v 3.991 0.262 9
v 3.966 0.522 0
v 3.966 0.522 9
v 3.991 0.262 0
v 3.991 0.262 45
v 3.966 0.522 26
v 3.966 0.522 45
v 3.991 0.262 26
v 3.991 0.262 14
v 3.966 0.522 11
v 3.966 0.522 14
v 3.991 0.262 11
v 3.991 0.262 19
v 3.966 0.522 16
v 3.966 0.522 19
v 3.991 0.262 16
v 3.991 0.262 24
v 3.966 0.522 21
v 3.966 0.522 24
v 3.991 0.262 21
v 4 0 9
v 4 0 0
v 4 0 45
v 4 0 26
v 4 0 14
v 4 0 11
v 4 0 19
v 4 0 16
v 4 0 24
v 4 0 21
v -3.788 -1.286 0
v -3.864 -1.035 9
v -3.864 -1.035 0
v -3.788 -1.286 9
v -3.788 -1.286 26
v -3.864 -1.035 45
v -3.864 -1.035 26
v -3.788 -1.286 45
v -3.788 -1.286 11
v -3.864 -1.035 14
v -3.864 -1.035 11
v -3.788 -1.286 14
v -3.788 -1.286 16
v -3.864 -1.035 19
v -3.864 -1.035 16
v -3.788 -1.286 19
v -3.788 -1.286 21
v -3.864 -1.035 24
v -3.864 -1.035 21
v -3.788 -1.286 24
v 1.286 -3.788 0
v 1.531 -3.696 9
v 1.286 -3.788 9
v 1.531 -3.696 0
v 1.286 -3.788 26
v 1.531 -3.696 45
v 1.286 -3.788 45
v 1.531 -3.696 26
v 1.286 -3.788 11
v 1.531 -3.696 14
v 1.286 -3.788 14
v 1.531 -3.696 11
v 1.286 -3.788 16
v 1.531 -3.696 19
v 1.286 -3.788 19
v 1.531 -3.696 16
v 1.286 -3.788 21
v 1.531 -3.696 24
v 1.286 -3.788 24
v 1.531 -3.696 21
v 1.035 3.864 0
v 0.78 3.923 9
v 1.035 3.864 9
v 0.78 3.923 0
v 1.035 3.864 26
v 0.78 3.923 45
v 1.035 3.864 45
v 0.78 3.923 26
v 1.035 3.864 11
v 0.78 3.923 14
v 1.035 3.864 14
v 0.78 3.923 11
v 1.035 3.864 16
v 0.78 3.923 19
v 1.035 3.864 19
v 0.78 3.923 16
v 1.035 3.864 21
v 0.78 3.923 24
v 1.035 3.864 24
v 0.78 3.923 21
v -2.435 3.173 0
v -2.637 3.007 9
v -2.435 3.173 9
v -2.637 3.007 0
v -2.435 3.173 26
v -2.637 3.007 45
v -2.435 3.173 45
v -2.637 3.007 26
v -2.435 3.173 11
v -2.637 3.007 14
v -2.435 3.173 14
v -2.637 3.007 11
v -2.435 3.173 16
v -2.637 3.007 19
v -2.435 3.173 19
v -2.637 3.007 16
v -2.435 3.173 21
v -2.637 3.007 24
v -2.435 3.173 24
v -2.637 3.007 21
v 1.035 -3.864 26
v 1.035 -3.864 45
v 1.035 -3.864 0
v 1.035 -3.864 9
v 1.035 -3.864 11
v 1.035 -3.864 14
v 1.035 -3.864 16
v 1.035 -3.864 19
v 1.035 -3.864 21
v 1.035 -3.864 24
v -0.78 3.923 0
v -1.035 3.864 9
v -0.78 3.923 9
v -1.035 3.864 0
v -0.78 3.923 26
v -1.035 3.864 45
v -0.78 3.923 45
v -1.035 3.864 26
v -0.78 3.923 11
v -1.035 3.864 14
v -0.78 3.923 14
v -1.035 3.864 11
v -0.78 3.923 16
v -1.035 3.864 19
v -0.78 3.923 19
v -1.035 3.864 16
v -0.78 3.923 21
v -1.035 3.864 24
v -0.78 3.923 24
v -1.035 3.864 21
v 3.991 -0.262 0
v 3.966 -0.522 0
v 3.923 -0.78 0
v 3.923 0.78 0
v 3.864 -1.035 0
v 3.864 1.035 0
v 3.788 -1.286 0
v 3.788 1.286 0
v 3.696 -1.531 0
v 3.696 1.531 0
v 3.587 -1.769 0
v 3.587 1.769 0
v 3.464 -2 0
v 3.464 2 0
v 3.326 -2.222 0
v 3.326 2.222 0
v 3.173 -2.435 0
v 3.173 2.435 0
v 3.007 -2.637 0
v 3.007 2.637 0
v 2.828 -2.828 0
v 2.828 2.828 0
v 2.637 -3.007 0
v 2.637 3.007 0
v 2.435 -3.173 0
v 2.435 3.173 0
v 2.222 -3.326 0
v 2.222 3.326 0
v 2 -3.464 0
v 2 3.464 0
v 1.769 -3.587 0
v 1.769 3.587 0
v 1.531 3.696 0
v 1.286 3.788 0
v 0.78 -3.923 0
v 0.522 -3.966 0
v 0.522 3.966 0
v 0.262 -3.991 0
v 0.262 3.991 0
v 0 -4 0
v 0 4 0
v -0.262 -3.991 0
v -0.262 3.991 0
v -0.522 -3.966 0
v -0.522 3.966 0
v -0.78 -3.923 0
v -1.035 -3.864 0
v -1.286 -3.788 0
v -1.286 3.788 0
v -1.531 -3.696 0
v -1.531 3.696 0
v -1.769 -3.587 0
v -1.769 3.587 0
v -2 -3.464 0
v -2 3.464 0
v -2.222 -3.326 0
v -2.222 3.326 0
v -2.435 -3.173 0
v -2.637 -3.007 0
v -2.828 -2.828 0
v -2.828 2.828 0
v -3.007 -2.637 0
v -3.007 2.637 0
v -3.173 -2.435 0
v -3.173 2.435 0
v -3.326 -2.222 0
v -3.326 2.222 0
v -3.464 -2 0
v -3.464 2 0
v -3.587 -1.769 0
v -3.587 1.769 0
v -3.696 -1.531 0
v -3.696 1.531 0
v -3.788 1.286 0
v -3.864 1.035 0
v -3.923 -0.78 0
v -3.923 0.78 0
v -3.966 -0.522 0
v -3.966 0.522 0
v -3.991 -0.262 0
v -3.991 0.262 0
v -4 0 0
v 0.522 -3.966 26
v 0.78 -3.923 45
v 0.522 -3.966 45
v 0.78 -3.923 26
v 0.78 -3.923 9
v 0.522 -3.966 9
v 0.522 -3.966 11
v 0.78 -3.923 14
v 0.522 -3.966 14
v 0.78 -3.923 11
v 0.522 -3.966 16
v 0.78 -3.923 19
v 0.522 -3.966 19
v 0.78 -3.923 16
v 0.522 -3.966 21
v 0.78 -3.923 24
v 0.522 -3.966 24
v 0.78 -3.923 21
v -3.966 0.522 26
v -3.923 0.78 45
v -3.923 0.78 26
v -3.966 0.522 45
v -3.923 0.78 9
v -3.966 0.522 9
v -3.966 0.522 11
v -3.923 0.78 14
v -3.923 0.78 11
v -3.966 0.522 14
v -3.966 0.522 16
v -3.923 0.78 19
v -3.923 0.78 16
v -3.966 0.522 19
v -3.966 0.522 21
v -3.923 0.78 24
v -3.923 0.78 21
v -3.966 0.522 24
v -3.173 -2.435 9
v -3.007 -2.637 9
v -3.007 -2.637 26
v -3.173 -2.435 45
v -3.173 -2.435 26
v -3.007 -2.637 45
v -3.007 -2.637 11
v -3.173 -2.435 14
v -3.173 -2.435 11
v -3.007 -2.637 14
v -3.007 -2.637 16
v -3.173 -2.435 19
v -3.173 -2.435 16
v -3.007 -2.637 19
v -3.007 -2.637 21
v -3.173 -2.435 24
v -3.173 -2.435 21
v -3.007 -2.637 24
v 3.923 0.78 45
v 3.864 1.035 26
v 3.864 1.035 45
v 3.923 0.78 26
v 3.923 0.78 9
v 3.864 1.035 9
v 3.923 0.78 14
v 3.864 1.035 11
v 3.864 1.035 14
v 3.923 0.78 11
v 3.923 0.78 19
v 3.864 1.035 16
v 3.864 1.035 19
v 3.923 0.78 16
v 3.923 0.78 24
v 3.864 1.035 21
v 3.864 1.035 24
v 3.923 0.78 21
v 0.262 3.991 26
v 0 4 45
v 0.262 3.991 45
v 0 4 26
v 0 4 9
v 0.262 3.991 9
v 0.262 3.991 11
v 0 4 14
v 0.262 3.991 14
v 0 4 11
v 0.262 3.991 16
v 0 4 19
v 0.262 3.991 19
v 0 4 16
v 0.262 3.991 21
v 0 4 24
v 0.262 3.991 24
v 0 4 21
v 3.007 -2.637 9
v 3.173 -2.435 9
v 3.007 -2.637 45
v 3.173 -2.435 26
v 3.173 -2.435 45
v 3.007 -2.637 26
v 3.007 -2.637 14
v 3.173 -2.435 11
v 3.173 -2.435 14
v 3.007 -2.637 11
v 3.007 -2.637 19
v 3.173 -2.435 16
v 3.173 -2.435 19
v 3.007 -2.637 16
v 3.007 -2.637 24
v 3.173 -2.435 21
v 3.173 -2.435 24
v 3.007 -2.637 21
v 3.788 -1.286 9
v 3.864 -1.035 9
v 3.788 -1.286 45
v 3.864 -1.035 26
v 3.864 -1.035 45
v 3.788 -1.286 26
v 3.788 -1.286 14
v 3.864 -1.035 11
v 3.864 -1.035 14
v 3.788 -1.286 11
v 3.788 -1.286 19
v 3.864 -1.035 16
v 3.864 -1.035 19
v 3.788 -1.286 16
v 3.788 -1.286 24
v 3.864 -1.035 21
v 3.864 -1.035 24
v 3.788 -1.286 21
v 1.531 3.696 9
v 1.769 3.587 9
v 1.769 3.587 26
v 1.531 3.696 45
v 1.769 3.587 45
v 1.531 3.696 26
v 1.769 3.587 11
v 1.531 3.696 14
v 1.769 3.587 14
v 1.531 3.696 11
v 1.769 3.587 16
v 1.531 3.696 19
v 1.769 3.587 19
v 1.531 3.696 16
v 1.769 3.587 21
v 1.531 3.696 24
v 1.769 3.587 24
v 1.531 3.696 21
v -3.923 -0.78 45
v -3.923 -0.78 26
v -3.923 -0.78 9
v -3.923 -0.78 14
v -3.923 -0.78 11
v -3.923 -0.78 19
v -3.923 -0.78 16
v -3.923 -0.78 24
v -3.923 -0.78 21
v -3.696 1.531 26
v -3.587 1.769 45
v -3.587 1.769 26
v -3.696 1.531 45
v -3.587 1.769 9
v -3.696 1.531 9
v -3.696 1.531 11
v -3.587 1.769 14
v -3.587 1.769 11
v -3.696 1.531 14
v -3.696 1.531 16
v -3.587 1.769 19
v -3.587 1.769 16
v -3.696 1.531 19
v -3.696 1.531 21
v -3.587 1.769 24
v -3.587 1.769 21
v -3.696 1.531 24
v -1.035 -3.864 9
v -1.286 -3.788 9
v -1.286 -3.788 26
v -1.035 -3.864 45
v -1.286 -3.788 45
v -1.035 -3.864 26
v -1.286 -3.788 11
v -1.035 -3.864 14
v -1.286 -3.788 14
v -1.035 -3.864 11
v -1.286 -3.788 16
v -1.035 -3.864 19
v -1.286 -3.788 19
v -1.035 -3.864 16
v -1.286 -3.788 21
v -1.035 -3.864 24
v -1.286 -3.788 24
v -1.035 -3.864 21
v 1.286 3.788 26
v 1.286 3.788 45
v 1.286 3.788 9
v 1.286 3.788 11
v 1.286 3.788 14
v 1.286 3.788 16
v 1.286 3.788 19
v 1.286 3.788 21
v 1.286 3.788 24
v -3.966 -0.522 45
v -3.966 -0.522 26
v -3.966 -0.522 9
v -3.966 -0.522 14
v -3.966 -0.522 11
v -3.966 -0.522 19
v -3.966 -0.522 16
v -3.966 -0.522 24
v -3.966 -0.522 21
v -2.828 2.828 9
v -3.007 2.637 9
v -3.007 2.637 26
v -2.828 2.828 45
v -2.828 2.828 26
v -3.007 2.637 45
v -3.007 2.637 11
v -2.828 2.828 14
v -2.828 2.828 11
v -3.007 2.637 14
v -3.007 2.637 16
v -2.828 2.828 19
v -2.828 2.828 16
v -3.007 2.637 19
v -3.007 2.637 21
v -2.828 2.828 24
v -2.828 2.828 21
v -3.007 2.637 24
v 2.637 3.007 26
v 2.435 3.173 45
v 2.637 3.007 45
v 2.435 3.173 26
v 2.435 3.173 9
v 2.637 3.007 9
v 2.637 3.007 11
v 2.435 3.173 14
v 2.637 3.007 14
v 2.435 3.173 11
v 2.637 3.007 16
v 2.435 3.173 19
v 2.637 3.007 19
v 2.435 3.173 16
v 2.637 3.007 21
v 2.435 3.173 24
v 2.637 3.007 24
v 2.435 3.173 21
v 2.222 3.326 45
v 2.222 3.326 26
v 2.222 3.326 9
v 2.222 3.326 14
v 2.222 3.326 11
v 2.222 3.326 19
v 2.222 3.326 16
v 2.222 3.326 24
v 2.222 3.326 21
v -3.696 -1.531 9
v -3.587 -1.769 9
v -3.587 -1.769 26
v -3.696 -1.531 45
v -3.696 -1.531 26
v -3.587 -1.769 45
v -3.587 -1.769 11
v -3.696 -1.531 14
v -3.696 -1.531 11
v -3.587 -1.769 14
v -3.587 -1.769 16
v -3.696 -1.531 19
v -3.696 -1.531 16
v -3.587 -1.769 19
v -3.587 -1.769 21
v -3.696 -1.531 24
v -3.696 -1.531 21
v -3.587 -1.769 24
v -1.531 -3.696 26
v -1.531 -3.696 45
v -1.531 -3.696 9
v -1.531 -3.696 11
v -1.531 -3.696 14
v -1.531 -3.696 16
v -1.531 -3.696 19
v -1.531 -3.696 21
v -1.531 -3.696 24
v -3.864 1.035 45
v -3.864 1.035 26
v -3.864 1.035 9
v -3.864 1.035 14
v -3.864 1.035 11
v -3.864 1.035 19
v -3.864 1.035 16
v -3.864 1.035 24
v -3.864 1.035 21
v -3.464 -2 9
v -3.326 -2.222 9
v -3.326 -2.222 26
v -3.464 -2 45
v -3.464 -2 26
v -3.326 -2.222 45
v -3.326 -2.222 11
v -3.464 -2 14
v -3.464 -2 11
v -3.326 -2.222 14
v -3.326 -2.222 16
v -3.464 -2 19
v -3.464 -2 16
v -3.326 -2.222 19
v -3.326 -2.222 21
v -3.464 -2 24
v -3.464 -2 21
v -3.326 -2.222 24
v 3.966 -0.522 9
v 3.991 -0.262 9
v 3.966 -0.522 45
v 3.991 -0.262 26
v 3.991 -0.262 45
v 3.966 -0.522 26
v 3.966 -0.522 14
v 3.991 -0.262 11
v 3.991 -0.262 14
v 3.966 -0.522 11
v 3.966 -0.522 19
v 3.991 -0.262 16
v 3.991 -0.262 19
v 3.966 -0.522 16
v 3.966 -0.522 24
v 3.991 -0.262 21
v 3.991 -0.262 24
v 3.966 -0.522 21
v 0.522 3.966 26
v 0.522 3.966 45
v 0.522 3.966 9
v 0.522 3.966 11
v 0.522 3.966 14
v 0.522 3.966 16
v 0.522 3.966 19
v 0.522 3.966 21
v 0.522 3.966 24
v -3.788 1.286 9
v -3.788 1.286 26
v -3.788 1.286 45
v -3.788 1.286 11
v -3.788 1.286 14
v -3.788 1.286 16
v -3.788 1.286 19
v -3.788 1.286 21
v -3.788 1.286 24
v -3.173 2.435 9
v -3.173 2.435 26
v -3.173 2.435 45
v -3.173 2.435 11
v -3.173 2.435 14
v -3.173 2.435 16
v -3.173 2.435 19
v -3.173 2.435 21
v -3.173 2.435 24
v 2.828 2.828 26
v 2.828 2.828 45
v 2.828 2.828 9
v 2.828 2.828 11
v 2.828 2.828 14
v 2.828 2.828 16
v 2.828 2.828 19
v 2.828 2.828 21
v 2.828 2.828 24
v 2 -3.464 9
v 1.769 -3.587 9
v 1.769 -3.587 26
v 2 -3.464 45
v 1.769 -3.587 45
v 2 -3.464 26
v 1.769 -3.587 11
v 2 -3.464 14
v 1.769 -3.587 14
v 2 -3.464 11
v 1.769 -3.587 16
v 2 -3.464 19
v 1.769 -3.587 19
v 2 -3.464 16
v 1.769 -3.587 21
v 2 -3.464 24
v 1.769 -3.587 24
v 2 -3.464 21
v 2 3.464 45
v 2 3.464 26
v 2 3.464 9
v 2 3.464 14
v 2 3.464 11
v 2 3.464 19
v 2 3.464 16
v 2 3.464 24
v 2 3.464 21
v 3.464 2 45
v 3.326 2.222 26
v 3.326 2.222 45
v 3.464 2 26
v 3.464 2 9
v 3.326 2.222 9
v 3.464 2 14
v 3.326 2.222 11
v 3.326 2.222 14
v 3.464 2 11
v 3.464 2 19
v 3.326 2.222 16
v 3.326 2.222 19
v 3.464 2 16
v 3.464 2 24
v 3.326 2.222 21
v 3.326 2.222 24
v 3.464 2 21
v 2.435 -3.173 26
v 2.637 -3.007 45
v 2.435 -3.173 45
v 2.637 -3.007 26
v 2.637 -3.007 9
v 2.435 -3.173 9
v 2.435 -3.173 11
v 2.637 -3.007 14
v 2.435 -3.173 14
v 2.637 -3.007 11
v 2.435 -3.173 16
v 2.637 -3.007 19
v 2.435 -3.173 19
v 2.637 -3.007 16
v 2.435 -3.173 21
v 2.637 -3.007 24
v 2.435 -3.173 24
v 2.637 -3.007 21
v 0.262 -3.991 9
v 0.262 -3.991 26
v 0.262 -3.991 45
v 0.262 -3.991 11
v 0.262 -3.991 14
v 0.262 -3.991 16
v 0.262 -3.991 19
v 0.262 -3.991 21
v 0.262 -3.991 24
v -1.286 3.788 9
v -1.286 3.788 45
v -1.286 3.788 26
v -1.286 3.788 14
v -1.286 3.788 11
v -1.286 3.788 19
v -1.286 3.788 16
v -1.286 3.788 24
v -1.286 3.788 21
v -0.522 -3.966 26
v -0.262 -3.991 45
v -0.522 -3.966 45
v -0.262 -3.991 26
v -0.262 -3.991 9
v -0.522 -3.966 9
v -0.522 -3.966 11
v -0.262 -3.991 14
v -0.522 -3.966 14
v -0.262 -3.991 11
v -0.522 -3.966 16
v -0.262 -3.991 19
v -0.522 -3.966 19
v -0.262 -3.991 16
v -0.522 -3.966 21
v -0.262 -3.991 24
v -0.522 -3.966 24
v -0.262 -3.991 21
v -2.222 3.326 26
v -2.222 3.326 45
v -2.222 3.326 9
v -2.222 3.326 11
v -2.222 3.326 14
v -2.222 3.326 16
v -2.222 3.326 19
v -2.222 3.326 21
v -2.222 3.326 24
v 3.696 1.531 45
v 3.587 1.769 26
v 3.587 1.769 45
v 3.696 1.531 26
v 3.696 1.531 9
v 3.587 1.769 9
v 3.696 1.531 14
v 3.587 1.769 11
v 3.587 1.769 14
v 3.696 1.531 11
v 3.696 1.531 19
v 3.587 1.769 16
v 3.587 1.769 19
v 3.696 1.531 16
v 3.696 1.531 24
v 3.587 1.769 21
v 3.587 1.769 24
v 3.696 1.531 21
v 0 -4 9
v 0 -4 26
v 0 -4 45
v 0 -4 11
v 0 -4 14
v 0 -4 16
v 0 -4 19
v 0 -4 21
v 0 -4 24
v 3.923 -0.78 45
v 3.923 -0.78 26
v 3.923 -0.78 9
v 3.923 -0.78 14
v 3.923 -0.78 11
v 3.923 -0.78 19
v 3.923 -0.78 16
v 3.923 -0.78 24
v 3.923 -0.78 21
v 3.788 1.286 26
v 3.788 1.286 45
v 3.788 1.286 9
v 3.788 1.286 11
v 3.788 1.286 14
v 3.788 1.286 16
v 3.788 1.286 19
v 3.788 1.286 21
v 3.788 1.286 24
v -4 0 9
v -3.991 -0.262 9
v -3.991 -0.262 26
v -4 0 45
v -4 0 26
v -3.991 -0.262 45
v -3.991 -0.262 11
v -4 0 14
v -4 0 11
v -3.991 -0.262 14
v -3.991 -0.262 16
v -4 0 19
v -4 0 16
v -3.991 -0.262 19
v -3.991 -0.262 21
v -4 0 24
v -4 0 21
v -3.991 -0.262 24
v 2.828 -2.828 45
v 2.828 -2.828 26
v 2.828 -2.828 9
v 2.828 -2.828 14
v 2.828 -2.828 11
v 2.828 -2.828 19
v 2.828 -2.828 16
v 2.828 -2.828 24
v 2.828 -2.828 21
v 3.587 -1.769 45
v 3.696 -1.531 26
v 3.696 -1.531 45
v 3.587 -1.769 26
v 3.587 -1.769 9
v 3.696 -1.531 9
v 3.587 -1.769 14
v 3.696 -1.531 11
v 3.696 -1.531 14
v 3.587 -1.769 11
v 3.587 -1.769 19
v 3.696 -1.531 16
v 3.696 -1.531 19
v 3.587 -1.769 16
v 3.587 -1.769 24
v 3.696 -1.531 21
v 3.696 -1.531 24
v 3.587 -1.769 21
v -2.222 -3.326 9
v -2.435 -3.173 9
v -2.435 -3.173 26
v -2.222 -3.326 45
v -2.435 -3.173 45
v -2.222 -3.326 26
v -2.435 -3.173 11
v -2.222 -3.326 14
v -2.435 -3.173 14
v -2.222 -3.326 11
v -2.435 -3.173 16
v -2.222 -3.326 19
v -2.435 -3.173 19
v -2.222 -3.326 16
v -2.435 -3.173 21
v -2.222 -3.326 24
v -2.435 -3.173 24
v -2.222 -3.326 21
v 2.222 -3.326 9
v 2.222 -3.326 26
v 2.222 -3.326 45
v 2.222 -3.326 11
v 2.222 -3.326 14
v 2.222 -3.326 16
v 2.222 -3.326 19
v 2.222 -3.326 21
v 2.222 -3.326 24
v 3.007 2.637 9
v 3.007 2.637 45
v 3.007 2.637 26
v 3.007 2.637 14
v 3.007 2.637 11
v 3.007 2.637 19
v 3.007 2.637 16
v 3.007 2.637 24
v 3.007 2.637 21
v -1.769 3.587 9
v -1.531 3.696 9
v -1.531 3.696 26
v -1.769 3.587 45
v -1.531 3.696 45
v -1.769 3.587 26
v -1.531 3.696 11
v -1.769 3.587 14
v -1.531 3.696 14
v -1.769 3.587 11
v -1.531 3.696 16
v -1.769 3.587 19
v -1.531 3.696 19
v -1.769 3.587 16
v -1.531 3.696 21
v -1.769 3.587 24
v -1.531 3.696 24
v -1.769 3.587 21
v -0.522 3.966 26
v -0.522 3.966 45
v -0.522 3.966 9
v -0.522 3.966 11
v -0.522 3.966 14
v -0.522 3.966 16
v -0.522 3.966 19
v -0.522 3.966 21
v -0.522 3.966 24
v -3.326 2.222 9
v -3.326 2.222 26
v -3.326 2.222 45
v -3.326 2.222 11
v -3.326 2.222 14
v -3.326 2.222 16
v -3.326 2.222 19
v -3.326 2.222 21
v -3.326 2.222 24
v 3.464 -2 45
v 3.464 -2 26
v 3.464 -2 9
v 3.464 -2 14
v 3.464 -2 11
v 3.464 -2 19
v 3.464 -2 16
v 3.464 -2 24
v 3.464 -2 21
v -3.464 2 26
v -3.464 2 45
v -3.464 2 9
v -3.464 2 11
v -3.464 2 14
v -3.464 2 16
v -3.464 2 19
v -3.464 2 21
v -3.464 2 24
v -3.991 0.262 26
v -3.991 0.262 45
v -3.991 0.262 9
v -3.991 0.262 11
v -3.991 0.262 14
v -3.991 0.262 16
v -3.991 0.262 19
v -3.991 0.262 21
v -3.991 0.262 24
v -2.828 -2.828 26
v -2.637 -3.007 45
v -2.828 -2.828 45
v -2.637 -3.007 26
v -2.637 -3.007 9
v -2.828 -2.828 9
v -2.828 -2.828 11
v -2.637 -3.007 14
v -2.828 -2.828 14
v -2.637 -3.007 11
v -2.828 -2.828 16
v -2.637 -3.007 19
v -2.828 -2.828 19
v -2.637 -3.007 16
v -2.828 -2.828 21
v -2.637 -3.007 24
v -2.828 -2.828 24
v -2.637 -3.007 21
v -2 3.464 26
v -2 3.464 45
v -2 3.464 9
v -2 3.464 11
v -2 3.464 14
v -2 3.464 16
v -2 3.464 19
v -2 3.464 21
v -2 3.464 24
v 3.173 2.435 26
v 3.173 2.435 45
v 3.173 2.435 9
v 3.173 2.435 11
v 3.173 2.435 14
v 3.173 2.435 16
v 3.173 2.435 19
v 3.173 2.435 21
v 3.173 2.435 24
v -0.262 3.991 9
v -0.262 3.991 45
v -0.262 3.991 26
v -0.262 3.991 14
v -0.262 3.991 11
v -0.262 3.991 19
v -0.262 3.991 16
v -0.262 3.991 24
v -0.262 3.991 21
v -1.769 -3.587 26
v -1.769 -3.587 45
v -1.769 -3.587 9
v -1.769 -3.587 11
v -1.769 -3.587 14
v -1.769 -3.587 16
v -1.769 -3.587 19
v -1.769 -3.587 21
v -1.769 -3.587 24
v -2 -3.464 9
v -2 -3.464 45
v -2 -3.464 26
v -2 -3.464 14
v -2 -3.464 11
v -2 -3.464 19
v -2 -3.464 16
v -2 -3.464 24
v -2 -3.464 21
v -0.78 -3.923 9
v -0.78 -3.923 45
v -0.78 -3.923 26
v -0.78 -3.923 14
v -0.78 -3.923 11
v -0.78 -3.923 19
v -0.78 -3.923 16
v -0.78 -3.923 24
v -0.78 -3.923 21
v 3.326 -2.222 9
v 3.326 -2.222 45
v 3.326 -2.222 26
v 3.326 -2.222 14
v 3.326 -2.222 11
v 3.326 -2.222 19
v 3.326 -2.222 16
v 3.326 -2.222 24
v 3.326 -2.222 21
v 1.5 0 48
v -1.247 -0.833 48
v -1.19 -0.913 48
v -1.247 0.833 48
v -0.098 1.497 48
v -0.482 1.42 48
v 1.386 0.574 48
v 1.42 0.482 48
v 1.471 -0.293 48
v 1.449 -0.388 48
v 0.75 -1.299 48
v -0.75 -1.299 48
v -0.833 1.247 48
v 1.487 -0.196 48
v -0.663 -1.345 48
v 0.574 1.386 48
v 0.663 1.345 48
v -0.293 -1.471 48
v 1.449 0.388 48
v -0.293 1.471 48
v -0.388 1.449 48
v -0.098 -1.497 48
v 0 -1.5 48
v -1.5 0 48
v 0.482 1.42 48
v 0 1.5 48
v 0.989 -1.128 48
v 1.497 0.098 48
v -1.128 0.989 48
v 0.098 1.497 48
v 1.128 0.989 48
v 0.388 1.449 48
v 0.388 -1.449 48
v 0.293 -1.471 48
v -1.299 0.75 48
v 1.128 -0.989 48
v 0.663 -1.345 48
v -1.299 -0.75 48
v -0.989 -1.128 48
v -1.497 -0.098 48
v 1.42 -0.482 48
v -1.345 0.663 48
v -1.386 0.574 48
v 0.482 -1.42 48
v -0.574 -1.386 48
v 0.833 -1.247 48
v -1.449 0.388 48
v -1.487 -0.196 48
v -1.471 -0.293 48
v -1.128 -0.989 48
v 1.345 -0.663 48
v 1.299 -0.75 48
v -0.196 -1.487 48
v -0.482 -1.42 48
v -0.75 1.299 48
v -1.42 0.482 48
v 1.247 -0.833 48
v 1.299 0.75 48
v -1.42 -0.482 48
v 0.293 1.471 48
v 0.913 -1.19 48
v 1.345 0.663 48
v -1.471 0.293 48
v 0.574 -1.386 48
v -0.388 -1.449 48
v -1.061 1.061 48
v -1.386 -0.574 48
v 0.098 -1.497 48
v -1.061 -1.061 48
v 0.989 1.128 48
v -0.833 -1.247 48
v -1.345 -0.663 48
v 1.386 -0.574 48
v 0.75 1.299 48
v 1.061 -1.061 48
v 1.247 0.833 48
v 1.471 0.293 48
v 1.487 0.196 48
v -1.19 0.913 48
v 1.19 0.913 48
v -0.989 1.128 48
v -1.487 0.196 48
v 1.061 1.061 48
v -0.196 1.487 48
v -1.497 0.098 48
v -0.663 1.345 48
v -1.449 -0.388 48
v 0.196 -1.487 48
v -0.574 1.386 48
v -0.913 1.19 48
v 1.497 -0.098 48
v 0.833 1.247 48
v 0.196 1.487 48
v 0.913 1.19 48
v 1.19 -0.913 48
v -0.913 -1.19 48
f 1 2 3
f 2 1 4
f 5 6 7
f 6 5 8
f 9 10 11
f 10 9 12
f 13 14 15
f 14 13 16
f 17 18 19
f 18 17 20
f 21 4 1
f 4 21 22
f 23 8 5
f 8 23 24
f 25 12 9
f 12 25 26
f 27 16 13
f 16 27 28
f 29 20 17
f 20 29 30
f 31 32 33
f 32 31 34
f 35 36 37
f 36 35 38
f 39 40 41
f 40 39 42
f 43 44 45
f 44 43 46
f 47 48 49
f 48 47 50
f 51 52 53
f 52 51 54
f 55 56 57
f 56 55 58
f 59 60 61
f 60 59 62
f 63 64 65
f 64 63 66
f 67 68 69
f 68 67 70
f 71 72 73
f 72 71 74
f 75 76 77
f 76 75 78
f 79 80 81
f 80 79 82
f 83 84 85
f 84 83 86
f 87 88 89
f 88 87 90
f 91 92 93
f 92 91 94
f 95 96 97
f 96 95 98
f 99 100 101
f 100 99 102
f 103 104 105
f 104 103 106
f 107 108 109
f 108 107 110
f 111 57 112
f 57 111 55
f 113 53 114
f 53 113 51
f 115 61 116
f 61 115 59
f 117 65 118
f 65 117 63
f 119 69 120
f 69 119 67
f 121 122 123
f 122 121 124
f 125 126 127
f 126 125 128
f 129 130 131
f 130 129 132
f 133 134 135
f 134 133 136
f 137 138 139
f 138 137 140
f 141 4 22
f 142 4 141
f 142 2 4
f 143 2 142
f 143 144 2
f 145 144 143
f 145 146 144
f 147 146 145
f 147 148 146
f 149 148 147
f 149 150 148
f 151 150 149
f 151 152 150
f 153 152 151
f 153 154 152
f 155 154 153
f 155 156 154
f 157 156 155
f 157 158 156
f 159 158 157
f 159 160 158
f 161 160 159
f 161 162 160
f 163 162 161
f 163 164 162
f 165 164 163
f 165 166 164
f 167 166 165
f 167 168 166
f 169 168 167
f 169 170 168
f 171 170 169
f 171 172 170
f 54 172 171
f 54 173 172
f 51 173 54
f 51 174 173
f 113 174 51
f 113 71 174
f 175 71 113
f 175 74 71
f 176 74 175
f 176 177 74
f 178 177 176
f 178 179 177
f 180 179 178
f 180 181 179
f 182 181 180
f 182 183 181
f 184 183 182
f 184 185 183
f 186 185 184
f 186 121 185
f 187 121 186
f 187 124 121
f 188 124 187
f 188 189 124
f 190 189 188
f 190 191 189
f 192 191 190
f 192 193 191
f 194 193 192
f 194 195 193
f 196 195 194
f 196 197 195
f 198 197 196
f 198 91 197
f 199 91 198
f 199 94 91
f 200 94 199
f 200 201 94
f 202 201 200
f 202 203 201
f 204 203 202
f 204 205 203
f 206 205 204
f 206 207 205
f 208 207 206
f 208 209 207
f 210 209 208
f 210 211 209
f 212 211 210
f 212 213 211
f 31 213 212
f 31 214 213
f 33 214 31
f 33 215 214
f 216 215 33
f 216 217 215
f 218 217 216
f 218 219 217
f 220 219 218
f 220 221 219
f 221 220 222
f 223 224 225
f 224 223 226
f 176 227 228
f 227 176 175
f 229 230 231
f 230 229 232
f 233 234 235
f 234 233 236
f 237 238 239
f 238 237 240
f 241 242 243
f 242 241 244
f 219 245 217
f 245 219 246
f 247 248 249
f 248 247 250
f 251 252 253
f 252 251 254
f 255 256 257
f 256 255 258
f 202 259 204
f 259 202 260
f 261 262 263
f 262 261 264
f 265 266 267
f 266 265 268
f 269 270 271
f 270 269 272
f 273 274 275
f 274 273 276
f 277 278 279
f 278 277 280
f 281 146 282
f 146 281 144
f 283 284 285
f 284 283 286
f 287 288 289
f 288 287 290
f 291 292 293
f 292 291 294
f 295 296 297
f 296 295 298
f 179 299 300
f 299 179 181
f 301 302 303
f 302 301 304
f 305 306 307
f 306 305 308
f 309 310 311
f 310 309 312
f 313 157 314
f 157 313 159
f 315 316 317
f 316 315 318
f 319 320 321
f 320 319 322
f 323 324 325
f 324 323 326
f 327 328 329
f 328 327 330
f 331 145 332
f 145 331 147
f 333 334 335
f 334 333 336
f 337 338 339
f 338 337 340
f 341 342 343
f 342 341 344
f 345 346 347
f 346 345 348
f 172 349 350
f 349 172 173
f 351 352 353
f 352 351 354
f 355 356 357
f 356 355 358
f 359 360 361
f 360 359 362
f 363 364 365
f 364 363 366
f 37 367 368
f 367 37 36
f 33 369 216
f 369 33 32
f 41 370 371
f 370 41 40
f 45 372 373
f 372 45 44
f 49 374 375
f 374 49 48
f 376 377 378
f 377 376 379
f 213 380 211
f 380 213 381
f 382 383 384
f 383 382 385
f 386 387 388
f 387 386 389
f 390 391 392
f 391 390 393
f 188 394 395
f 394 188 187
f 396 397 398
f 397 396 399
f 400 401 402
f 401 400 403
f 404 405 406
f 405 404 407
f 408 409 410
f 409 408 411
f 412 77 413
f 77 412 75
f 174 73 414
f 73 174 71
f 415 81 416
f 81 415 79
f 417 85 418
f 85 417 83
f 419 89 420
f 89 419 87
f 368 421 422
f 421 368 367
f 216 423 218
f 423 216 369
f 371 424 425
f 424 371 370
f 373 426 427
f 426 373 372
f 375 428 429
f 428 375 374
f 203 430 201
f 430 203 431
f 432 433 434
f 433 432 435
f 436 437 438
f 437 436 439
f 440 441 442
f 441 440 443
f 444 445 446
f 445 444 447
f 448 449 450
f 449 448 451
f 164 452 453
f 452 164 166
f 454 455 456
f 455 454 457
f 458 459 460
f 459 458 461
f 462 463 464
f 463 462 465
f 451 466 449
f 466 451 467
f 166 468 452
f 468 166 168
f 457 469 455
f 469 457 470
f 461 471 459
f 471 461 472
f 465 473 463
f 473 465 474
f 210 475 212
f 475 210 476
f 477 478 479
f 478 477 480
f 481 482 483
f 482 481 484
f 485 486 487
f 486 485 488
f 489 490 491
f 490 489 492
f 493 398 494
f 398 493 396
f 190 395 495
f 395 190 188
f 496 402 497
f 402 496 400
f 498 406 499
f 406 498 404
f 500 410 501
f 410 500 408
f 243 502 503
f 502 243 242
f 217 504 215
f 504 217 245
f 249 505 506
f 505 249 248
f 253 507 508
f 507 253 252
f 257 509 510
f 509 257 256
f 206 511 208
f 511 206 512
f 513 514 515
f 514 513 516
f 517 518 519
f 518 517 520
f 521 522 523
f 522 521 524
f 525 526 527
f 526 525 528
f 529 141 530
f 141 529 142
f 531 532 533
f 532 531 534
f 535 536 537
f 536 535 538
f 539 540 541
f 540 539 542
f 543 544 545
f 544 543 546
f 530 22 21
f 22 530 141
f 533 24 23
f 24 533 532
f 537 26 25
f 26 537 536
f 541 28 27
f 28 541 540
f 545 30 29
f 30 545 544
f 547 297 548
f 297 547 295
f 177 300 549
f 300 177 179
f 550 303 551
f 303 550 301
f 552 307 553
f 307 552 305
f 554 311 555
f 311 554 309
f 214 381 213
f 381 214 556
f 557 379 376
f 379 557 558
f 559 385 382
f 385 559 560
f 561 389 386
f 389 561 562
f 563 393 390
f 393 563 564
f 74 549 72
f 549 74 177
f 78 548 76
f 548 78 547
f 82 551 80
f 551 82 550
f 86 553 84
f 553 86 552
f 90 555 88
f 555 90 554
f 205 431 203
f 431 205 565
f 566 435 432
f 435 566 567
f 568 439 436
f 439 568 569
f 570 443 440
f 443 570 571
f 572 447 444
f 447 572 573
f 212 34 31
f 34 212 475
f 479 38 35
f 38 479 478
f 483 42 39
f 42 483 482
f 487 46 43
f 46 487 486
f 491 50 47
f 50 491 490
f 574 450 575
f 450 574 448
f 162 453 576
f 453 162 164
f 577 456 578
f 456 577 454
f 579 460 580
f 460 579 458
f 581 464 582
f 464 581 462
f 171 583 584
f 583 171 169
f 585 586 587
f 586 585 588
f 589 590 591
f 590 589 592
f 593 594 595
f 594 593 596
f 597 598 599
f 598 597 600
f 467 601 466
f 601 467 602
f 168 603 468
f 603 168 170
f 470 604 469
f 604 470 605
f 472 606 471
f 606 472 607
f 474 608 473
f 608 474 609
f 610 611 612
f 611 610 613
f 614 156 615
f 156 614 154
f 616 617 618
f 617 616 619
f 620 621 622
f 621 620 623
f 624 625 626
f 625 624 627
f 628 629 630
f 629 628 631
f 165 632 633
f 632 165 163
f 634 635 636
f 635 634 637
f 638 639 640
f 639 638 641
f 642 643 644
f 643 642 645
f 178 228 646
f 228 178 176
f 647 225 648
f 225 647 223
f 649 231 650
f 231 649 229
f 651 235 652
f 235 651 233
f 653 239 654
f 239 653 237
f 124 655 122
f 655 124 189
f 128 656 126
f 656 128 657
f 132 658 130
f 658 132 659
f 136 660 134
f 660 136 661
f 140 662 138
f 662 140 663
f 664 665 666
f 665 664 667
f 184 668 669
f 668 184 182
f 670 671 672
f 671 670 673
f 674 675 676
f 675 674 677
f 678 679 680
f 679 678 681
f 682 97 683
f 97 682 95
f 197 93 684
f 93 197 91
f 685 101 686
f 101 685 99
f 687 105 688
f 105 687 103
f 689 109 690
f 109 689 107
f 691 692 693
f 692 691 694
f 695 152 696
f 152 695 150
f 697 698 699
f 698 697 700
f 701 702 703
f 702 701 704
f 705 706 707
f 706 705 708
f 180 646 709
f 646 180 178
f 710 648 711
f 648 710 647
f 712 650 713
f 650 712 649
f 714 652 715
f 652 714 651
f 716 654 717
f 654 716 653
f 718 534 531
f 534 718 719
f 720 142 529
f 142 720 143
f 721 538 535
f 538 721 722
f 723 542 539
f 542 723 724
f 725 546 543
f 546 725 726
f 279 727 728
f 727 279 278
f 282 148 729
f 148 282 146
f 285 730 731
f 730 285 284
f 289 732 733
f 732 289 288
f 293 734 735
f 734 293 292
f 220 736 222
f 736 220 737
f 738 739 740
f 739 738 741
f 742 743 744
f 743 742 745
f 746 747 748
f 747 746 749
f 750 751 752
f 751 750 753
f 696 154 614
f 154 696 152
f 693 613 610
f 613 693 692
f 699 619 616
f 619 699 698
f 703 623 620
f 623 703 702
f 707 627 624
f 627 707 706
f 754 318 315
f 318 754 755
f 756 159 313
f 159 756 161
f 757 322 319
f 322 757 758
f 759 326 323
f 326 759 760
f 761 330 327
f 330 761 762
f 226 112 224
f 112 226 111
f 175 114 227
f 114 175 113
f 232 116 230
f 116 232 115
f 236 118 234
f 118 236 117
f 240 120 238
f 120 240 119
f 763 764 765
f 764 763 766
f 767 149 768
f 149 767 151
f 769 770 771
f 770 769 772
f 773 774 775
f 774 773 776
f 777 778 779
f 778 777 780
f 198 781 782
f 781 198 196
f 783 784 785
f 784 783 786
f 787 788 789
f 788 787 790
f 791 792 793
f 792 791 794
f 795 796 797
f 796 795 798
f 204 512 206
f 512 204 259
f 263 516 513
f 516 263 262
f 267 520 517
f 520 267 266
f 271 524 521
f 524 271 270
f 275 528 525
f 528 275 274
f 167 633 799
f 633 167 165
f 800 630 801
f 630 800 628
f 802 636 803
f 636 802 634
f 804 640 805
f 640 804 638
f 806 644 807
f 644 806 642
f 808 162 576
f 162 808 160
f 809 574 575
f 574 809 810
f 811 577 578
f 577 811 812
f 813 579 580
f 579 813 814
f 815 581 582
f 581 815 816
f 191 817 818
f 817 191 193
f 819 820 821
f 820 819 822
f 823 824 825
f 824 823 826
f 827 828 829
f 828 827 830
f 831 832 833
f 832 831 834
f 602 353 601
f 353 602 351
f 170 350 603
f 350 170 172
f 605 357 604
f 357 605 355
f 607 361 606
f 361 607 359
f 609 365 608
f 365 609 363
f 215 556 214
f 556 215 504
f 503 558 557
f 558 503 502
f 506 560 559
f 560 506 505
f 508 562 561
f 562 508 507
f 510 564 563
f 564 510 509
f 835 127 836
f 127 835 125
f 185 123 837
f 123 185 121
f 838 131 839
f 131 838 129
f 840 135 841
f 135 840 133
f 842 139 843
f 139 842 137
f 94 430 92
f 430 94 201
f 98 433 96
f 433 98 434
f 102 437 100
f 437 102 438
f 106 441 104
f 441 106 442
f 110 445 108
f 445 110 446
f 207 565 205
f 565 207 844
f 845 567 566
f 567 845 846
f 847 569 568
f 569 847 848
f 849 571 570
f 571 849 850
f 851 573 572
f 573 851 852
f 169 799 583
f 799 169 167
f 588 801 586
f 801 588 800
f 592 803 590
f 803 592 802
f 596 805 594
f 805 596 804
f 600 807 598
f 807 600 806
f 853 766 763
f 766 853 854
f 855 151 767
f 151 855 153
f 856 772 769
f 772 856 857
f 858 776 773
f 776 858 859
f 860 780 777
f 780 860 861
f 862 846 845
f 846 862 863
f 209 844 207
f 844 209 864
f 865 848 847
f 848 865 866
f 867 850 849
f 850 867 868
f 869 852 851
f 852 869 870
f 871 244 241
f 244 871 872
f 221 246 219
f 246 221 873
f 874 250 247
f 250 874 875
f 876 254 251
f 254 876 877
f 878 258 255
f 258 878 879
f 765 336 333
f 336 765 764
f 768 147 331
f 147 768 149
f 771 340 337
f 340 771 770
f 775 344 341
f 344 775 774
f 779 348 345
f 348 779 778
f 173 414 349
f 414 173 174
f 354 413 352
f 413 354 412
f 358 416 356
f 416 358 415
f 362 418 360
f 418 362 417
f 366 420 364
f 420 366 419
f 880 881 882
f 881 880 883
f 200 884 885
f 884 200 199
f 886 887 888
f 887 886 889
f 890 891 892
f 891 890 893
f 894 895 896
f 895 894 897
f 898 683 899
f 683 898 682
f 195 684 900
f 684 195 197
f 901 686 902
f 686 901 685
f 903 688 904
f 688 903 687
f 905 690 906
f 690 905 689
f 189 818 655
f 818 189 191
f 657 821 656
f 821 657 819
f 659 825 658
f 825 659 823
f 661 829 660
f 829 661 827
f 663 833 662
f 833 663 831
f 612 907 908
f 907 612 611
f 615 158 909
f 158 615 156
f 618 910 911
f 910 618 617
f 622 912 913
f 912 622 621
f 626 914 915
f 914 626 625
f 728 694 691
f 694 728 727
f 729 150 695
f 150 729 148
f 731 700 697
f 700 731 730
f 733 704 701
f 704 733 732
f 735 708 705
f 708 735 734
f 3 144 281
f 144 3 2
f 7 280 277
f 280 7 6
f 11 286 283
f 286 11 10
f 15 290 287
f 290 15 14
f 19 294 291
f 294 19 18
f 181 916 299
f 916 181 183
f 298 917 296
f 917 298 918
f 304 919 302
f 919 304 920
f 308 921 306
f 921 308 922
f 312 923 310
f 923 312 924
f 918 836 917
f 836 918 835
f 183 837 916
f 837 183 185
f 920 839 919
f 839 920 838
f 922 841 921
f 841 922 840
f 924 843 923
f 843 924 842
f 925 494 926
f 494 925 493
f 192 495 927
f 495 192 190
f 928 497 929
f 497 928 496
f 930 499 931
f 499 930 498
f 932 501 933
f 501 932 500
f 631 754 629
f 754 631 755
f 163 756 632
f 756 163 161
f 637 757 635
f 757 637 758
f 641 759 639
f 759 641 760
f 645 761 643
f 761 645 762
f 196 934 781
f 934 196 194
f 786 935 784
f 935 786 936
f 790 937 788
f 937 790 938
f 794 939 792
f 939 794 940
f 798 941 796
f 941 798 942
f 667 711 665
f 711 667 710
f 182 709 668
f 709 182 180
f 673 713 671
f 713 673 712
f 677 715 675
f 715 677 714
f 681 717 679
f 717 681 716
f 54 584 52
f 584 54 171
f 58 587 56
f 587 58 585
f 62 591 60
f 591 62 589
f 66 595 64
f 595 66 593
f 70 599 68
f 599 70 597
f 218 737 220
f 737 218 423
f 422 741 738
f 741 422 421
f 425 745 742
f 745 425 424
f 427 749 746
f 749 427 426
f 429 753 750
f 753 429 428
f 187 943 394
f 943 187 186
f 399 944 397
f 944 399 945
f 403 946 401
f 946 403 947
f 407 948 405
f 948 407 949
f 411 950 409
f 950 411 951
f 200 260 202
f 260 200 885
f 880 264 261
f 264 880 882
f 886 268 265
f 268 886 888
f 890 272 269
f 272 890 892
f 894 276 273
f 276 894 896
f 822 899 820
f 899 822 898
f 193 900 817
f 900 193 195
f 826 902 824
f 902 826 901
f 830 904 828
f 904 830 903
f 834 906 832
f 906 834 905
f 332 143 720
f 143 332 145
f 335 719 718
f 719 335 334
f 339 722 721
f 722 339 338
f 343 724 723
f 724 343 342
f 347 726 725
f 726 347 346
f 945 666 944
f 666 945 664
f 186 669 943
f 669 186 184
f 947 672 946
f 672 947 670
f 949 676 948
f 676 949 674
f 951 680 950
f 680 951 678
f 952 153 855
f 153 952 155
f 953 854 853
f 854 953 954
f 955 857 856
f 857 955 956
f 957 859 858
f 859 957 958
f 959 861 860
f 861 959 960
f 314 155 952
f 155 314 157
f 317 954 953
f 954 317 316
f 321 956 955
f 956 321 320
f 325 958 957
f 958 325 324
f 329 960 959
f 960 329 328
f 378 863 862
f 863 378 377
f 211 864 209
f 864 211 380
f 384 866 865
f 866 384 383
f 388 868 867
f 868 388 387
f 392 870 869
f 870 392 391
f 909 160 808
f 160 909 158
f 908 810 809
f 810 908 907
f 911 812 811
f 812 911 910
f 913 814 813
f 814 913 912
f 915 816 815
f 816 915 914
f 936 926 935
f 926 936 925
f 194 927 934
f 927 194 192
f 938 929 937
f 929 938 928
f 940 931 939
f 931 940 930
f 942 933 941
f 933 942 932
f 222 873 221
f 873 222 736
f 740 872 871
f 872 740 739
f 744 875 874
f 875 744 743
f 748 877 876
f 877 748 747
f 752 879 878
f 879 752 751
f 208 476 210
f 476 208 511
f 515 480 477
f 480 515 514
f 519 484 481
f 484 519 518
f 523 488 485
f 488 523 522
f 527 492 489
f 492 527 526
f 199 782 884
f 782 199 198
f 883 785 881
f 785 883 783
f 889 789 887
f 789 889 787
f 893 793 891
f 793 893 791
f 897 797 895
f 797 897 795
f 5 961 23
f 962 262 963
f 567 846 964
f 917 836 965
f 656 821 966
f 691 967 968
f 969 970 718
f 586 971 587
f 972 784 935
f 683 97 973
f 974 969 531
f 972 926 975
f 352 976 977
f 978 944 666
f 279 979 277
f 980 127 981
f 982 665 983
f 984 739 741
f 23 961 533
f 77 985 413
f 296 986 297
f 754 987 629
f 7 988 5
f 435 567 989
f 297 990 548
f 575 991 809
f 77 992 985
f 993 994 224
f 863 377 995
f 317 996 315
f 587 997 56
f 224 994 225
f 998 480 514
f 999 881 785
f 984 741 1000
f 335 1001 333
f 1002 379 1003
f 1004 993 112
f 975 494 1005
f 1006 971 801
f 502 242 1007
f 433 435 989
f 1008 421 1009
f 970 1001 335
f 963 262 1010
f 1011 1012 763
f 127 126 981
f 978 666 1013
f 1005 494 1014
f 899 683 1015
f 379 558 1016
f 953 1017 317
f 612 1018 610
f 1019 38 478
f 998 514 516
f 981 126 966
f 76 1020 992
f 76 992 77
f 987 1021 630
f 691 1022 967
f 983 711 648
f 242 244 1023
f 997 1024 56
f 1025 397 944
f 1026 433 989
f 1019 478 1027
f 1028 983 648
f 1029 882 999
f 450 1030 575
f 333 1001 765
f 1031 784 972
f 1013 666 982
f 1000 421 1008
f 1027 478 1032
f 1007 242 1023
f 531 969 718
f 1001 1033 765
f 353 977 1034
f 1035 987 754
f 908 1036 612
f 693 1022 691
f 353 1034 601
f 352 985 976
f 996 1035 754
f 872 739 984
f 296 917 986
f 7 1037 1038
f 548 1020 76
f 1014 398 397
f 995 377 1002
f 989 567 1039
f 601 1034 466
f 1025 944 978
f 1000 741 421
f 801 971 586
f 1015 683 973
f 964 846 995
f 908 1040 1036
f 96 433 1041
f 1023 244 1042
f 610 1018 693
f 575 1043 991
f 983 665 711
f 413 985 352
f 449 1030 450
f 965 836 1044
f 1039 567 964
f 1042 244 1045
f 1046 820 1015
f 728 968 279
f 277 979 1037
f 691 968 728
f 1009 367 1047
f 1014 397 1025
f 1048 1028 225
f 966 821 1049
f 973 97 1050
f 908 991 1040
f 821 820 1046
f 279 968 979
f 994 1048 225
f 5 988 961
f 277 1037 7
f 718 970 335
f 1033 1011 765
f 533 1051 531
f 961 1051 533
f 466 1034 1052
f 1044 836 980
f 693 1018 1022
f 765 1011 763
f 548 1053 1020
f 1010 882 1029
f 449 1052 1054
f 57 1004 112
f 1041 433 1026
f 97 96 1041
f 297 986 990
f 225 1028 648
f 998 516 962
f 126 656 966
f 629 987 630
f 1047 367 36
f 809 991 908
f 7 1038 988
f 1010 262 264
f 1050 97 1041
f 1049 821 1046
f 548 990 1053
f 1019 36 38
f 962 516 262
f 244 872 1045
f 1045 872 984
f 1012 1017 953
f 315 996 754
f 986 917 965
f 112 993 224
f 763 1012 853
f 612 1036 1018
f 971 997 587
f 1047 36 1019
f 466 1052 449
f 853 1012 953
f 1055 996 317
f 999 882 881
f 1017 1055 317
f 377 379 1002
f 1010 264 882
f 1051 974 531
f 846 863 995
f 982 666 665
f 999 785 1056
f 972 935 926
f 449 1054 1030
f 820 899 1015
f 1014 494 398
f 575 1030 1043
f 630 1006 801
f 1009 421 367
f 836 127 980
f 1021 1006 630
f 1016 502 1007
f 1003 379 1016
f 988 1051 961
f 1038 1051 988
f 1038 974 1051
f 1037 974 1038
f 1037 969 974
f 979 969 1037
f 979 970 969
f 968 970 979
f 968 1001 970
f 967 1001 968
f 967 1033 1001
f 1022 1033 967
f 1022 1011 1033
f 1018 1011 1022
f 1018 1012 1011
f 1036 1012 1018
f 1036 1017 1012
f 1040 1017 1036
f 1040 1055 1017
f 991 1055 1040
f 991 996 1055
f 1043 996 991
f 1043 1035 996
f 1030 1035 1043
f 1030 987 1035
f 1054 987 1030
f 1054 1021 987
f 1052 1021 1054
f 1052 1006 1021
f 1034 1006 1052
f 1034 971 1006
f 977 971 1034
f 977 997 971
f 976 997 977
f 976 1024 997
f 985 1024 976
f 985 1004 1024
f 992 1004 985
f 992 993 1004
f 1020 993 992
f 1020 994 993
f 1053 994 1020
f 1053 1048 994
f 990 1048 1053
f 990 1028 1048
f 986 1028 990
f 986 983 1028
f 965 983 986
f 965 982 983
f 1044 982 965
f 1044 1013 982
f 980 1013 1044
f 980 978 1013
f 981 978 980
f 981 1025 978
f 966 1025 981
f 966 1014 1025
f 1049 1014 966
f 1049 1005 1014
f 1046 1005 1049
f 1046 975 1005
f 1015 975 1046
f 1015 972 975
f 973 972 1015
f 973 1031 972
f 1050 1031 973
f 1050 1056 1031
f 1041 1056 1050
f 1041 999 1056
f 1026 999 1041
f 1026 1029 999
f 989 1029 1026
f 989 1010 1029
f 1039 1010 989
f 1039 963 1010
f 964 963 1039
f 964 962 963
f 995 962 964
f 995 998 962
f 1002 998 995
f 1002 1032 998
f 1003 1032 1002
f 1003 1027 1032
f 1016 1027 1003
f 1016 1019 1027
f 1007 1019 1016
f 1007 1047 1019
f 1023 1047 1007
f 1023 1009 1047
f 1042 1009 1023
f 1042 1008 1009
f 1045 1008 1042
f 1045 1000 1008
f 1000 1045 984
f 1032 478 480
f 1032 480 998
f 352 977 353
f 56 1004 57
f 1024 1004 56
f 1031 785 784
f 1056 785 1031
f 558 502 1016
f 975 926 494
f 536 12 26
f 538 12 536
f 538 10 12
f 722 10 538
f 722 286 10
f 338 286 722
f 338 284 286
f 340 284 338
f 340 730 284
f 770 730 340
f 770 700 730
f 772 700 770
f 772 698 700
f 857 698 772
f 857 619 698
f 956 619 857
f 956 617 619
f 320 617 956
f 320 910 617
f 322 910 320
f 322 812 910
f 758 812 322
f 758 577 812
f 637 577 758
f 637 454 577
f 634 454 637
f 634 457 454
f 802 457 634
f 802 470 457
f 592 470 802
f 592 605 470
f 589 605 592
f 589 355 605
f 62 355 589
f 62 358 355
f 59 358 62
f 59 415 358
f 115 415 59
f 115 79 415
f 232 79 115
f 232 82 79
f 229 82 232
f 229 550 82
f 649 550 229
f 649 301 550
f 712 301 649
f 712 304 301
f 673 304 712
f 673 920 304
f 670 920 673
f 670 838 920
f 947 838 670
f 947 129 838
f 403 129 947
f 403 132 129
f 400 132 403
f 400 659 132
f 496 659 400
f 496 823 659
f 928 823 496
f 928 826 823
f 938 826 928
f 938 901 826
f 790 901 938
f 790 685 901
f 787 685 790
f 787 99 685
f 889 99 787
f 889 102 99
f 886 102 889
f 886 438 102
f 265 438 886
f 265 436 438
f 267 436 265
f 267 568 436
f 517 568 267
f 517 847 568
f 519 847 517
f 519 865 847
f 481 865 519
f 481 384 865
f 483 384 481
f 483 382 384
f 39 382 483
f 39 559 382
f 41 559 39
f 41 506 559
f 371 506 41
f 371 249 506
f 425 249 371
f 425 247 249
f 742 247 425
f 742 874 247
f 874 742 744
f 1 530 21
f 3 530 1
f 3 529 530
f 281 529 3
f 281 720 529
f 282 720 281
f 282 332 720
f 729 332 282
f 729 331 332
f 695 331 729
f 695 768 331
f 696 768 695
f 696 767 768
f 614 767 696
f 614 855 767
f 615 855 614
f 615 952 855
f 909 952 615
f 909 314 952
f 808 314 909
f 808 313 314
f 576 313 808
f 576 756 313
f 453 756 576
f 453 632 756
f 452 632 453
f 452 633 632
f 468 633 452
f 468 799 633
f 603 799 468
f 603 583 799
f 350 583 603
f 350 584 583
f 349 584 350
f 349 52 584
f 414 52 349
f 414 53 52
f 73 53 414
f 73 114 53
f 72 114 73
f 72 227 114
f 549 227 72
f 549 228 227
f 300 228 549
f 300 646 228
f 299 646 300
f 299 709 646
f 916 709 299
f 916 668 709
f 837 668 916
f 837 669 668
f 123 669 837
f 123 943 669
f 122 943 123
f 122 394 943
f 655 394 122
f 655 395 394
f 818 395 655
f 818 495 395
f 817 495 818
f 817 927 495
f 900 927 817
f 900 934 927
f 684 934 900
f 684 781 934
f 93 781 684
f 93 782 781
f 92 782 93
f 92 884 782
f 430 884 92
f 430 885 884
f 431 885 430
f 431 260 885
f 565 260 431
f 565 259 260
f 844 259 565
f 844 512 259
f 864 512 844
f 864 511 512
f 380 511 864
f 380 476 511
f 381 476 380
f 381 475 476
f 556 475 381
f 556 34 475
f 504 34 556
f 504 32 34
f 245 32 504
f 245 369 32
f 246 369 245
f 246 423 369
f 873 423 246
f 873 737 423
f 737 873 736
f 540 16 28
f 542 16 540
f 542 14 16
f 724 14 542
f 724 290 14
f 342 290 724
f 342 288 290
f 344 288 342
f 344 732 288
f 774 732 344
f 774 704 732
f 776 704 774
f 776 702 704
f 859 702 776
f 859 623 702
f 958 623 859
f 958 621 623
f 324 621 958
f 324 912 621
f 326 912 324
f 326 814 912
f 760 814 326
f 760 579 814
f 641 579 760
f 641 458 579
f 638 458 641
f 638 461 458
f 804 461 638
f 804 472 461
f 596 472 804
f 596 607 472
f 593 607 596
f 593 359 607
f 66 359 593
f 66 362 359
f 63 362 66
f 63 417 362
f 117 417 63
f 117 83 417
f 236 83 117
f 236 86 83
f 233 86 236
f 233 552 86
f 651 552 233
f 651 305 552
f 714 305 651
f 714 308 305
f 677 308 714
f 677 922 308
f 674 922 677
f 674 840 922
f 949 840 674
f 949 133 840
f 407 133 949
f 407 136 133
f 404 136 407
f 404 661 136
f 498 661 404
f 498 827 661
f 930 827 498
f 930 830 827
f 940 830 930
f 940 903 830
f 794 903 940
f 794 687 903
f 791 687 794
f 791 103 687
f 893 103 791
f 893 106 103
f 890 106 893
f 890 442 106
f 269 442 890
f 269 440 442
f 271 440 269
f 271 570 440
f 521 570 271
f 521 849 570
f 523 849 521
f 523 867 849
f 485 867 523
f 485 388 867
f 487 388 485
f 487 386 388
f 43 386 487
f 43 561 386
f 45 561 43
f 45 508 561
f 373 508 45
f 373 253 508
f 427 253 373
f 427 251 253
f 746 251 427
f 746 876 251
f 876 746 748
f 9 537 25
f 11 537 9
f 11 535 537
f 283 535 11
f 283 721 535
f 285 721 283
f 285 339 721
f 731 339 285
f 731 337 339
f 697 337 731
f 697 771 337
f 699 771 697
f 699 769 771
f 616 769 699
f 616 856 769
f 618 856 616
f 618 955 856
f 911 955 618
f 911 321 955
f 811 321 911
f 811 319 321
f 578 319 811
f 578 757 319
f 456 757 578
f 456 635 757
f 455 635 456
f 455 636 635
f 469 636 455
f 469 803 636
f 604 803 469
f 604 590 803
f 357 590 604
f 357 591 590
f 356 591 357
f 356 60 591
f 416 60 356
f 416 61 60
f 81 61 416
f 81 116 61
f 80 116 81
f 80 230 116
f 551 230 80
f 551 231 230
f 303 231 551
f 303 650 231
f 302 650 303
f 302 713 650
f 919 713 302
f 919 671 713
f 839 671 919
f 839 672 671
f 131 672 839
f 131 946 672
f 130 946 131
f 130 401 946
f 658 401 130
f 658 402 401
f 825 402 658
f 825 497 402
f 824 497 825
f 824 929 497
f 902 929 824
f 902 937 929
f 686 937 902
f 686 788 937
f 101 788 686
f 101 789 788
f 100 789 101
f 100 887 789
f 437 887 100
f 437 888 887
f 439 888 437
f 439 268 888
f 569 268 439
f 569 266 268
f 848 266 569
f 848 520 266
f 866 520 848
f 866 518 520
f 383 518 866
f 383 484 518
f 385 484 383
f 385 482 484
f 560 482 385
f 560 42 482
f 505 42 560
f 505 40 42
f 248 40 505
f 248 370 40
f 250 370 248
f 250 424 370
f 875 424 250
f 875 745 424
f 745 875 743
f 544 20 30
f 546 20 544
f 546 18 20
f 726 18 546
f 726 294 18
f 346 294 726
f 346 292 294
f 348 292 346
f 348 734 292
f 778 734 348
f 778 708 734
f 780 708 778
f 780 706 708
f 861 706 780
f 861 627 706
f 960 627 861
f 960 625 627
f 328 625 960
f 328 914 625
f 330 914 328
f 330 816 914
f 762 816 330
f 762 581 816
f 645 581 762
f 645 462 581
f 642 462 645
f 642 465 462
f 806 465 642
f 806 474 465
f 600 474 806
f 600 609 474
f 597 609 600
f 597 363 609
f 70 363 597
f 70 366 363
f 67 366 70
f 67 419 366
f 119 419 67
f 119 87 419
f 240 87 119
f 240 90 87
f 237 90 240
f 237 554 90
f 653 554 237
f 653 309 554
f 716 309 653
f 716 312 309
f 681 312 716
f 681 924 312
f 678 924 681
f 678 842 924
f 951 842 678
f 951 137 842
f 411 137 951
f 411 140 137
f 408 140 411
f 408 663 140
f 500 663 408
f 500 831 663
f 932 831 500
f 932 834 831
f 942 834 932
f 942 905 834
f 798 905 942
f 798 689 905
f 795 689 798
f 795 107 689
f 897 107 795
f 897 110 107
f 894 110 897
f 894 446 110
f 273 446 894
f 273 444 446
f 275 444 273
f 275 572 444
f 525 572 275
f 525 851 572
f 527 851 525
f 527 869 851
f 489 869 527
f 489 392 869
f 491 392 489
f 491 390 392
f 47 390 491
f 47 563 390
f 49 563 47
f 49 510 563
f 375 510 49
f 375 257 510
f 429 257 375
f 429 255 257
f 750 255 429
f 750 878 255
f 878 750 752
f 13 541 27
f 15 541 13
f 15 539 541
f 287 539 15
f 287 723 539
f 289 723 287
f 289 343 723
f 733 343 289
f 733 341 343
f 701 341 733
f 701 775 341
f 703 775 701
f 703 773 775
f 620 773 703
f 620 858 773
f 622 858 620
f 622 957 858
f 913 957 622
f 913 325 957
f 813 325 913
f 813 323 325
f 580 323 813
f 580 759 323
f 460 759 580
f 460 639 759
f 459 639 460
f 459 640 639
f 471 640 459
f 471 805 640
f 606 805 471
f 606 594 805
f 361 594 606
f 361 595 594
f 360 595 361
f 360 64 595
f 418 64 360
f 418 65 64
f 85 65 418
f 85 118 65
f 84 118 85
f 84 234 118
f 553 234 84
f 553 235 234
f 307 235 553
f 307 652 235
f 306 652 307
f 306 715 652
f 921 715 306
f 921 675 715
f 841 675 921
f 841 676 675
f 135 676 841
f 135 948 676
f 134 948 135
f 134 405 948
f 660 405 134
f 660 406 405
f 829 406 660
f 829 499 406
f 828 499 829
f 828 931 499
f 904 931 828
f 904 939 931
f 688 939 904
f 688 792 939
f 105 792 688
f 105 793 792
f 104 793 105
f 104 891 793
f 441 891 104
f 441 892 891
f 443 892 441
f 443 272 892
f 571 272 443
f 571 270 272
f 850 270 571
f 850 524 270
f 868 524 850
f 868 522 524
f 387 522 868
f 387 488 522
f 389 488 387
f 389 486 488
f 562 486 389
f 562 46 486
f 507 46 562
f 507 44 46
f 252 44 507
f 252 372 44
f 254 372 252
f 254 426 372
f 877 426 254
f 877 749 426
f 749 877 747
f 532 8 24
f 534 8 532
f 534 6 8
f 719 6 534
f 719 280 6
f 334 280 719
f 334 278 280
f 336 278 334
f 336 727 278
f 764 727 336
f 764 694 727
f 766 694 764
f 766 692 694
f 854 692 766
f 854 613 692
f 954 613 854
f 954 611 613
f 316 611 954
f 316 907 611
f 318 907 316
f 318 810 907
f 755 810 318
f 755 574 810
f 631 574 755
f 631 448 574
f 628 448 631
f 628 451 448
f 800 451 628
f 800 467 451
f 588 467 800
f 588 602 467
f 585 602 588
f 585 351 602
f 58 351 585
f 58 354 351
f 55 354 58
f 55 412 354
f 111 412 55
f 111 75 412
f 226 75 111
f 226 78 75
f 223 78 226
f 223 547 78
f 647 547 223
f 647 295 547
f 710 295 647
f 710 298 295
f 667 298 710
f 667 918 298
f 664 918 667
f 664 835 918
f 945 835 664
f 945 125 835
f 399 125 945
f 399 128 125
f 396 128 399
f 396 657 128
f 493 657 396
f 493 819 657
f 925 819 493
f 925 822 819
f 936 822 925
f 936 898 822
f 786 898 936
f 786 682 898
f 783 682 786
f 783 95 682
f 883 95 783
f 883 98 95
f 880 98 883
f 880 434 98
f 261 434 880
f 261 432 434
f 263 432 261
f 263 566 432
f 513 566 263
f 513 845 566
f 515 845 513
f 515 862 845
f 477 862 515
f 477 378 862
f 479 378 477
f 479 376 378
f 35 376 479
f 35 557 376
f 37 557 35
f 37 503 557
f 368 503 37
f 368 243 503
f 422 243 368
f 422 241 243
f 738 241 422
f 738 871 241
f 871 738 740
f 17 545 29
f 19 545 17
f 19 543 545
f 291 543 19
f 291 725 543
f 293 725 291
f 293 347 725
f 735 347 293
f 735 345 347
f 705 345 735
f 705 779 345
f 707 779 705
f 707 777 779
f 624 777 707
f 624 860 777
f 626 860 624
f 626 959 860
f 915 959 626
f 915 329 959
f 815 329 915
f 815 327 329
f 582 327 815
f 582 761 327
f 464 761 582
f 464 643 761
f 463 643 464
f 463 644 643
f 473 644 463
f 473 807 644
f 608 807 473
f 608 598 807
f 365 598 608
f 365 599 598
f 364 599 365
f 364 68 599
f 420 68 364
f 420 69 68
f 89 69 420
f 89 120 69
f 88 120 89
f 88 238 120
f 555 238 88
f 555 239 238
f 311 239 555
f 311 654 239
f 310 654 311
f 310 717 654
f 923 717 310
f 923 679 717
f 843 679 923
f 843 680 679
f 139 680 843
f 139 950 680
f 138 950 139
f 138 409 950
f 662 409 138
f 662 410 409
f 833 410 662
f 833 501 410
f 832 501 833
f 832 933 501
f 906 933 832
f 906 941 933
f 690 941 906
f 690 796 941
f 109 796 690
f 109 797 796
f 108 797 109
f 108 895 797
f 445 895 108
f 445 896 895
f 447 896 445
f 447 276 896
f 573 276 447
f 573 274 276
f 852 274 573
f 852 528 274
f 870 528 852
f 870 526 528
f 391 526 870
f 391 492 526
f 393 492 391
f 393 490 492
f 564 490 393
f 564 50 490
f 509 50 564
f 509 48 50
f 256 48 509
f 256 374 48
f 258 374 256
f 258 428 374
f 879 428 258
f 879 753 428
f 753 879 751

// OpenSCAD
// Pestle for grinding tissue inside a 1.5 mL microcentrifuge tube
// Printed standing upright: handle at the bottom, tip at the top.
//
// Dimensions (mm):
//   handle_d      = 8.00   // handle diameter
//   handle_h      = 45.00  // handle height (z = 0 to 45)
//   cone_bottom_d = 3.00   // cone diameter at z = 62
//   sphere_d      = 3.00   // tip sphere diameter
//   groove_count  = 4      // number of circumferential grooves
//   groove_w      = 2.00   // groove width in Z
//   groove_depth  = 1.00   // groove depth from surface
//   groove_z      = [10, 15, 20, 25] // groove centre heights

// ---------------- Parameters ----------------
handle_d      = 8.0;
handle_h      = 45.0;
cone_bottom_d = 3.0;
sphere_d      = 3.0;
groove_count  = 4;
groove_w      = 2.0;
groove_depth  = 1.0;
groove_z      = [10, 15, 20, 25];

eps = 0.5;      // cutter overshoot past faces (mm)

$fn = 96;

// ---------------- Model ----------------
difference() {
    union() {
        // (1) Cylindrical handle: z = 0 to 45
        cylinder(d = handle_d, h = handle_h);

        // (2) Cone: z = 45 to 62, 8 mm -> 3 mm diameter
        translate([0, 0, handle_h])
            cylinder(d1 = handle_d, d2 = cone_bottom_d, h = sphere_d);

        // (3) Rounded tip: sphere centred at z = 62
        translate([0, 0, handle_h + sphere_d / 2])
            sphere(d = sphere_d);
    }

    // Grip grooves
    for (z = groove_z)
        translate([0, 0, z - groove_w / 2])
            cylinder(d = handle_d + 2 * eps, h = groove_w, $fn = 96);
}
